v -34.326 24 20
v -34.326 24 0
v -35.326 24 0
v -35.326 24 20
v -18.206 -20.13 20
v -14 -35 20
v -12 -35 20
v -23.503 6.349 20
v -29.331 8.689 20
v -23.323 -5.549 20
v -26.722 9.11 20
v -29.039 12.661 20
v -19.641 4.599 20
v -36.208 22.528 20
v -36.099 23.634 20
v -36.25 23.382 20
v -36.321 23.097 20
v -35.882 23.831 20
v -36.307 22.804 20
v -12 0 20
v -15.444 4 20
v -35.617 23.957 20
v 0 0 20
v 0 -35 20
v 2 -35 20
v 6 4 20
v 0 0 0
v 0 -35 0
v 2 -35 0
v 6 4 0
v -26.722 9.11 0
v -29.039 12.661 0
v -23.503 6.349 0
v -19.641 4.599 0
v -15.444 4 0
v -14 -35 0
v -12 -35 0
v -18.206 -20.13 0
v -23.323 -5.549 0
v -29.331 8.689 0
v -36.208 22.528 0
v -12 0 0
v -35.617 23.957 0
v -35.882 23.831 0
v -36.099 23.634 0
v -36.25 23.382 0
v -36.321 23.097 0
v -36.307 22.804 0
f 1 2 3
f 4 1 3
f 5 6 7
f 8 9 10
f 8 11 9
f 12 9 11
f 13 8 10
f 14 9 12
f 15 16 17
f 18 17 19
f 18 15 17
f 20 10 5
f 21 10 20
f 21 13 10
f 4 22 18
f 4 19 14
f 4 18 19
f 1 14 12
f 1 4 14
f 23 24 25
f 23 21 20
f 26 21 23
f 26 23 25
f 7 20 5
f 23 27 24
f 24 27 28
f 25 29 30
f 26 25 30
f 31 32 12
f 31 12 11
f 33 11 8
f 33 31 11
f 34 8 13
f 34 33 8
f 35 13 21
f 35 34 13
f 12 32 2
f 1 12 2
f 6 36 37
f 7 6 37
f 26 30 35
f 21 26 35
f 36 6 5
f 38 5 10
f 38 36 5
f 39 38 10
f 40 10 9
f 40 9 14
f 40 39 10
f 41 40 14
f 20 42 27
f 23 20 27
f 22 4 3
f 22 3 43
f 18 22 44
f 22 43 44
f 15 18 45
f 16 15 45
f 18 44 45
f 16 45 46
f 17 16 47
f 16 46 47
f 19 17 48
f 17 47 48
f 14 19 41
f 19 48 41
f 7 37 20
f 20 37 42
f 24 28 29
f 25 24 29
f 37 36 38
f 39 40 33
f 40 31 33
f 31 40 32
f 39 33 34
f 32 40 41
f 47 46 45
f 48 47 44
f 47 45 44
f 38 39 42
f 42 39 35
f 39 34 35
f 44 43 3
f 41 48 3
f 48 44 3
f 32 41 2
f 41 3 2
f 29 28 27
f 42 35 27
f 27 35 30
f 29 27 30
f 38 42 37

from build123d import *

# Parameters (mm, degrees)
PAD_DEPTH = 20


with BuildPart() as part:
    # Sketch → Pad (new body)
    with BuildSketch(Plane.XY):
        with BuildLine():
            Line((0, 0), (0, -35))
            Line((0, -35), (2, -35))
            Line((2, -35), (6, 4))
            Line((6, 4), (-15.443946, 4))
            ThreePointArc((-29.038563, 12.660726), (-23.50344, 6.349128), (-15.443946, 4))
            Line((-29.038563, 12.660726), (-34.326153, 24))
            Line((-34.326153, 24), (-35.326153, 24))
            ThreePointArc((-35.326153, 24), (-36.184185, 23.513597), (-36.207518, 22.527564))
            ThreePointArc((-14, -35), (-23.323239, -5.548879), (-36.207518, 22.527564))
            Line((-14, -35), (-12, -35))
            Line((-12, -35), (-12, 0))
            Line((-12, 0), (0, 0))
        make_face()
    extrude(amount=PAD_DEPTH)


solid = part.part
